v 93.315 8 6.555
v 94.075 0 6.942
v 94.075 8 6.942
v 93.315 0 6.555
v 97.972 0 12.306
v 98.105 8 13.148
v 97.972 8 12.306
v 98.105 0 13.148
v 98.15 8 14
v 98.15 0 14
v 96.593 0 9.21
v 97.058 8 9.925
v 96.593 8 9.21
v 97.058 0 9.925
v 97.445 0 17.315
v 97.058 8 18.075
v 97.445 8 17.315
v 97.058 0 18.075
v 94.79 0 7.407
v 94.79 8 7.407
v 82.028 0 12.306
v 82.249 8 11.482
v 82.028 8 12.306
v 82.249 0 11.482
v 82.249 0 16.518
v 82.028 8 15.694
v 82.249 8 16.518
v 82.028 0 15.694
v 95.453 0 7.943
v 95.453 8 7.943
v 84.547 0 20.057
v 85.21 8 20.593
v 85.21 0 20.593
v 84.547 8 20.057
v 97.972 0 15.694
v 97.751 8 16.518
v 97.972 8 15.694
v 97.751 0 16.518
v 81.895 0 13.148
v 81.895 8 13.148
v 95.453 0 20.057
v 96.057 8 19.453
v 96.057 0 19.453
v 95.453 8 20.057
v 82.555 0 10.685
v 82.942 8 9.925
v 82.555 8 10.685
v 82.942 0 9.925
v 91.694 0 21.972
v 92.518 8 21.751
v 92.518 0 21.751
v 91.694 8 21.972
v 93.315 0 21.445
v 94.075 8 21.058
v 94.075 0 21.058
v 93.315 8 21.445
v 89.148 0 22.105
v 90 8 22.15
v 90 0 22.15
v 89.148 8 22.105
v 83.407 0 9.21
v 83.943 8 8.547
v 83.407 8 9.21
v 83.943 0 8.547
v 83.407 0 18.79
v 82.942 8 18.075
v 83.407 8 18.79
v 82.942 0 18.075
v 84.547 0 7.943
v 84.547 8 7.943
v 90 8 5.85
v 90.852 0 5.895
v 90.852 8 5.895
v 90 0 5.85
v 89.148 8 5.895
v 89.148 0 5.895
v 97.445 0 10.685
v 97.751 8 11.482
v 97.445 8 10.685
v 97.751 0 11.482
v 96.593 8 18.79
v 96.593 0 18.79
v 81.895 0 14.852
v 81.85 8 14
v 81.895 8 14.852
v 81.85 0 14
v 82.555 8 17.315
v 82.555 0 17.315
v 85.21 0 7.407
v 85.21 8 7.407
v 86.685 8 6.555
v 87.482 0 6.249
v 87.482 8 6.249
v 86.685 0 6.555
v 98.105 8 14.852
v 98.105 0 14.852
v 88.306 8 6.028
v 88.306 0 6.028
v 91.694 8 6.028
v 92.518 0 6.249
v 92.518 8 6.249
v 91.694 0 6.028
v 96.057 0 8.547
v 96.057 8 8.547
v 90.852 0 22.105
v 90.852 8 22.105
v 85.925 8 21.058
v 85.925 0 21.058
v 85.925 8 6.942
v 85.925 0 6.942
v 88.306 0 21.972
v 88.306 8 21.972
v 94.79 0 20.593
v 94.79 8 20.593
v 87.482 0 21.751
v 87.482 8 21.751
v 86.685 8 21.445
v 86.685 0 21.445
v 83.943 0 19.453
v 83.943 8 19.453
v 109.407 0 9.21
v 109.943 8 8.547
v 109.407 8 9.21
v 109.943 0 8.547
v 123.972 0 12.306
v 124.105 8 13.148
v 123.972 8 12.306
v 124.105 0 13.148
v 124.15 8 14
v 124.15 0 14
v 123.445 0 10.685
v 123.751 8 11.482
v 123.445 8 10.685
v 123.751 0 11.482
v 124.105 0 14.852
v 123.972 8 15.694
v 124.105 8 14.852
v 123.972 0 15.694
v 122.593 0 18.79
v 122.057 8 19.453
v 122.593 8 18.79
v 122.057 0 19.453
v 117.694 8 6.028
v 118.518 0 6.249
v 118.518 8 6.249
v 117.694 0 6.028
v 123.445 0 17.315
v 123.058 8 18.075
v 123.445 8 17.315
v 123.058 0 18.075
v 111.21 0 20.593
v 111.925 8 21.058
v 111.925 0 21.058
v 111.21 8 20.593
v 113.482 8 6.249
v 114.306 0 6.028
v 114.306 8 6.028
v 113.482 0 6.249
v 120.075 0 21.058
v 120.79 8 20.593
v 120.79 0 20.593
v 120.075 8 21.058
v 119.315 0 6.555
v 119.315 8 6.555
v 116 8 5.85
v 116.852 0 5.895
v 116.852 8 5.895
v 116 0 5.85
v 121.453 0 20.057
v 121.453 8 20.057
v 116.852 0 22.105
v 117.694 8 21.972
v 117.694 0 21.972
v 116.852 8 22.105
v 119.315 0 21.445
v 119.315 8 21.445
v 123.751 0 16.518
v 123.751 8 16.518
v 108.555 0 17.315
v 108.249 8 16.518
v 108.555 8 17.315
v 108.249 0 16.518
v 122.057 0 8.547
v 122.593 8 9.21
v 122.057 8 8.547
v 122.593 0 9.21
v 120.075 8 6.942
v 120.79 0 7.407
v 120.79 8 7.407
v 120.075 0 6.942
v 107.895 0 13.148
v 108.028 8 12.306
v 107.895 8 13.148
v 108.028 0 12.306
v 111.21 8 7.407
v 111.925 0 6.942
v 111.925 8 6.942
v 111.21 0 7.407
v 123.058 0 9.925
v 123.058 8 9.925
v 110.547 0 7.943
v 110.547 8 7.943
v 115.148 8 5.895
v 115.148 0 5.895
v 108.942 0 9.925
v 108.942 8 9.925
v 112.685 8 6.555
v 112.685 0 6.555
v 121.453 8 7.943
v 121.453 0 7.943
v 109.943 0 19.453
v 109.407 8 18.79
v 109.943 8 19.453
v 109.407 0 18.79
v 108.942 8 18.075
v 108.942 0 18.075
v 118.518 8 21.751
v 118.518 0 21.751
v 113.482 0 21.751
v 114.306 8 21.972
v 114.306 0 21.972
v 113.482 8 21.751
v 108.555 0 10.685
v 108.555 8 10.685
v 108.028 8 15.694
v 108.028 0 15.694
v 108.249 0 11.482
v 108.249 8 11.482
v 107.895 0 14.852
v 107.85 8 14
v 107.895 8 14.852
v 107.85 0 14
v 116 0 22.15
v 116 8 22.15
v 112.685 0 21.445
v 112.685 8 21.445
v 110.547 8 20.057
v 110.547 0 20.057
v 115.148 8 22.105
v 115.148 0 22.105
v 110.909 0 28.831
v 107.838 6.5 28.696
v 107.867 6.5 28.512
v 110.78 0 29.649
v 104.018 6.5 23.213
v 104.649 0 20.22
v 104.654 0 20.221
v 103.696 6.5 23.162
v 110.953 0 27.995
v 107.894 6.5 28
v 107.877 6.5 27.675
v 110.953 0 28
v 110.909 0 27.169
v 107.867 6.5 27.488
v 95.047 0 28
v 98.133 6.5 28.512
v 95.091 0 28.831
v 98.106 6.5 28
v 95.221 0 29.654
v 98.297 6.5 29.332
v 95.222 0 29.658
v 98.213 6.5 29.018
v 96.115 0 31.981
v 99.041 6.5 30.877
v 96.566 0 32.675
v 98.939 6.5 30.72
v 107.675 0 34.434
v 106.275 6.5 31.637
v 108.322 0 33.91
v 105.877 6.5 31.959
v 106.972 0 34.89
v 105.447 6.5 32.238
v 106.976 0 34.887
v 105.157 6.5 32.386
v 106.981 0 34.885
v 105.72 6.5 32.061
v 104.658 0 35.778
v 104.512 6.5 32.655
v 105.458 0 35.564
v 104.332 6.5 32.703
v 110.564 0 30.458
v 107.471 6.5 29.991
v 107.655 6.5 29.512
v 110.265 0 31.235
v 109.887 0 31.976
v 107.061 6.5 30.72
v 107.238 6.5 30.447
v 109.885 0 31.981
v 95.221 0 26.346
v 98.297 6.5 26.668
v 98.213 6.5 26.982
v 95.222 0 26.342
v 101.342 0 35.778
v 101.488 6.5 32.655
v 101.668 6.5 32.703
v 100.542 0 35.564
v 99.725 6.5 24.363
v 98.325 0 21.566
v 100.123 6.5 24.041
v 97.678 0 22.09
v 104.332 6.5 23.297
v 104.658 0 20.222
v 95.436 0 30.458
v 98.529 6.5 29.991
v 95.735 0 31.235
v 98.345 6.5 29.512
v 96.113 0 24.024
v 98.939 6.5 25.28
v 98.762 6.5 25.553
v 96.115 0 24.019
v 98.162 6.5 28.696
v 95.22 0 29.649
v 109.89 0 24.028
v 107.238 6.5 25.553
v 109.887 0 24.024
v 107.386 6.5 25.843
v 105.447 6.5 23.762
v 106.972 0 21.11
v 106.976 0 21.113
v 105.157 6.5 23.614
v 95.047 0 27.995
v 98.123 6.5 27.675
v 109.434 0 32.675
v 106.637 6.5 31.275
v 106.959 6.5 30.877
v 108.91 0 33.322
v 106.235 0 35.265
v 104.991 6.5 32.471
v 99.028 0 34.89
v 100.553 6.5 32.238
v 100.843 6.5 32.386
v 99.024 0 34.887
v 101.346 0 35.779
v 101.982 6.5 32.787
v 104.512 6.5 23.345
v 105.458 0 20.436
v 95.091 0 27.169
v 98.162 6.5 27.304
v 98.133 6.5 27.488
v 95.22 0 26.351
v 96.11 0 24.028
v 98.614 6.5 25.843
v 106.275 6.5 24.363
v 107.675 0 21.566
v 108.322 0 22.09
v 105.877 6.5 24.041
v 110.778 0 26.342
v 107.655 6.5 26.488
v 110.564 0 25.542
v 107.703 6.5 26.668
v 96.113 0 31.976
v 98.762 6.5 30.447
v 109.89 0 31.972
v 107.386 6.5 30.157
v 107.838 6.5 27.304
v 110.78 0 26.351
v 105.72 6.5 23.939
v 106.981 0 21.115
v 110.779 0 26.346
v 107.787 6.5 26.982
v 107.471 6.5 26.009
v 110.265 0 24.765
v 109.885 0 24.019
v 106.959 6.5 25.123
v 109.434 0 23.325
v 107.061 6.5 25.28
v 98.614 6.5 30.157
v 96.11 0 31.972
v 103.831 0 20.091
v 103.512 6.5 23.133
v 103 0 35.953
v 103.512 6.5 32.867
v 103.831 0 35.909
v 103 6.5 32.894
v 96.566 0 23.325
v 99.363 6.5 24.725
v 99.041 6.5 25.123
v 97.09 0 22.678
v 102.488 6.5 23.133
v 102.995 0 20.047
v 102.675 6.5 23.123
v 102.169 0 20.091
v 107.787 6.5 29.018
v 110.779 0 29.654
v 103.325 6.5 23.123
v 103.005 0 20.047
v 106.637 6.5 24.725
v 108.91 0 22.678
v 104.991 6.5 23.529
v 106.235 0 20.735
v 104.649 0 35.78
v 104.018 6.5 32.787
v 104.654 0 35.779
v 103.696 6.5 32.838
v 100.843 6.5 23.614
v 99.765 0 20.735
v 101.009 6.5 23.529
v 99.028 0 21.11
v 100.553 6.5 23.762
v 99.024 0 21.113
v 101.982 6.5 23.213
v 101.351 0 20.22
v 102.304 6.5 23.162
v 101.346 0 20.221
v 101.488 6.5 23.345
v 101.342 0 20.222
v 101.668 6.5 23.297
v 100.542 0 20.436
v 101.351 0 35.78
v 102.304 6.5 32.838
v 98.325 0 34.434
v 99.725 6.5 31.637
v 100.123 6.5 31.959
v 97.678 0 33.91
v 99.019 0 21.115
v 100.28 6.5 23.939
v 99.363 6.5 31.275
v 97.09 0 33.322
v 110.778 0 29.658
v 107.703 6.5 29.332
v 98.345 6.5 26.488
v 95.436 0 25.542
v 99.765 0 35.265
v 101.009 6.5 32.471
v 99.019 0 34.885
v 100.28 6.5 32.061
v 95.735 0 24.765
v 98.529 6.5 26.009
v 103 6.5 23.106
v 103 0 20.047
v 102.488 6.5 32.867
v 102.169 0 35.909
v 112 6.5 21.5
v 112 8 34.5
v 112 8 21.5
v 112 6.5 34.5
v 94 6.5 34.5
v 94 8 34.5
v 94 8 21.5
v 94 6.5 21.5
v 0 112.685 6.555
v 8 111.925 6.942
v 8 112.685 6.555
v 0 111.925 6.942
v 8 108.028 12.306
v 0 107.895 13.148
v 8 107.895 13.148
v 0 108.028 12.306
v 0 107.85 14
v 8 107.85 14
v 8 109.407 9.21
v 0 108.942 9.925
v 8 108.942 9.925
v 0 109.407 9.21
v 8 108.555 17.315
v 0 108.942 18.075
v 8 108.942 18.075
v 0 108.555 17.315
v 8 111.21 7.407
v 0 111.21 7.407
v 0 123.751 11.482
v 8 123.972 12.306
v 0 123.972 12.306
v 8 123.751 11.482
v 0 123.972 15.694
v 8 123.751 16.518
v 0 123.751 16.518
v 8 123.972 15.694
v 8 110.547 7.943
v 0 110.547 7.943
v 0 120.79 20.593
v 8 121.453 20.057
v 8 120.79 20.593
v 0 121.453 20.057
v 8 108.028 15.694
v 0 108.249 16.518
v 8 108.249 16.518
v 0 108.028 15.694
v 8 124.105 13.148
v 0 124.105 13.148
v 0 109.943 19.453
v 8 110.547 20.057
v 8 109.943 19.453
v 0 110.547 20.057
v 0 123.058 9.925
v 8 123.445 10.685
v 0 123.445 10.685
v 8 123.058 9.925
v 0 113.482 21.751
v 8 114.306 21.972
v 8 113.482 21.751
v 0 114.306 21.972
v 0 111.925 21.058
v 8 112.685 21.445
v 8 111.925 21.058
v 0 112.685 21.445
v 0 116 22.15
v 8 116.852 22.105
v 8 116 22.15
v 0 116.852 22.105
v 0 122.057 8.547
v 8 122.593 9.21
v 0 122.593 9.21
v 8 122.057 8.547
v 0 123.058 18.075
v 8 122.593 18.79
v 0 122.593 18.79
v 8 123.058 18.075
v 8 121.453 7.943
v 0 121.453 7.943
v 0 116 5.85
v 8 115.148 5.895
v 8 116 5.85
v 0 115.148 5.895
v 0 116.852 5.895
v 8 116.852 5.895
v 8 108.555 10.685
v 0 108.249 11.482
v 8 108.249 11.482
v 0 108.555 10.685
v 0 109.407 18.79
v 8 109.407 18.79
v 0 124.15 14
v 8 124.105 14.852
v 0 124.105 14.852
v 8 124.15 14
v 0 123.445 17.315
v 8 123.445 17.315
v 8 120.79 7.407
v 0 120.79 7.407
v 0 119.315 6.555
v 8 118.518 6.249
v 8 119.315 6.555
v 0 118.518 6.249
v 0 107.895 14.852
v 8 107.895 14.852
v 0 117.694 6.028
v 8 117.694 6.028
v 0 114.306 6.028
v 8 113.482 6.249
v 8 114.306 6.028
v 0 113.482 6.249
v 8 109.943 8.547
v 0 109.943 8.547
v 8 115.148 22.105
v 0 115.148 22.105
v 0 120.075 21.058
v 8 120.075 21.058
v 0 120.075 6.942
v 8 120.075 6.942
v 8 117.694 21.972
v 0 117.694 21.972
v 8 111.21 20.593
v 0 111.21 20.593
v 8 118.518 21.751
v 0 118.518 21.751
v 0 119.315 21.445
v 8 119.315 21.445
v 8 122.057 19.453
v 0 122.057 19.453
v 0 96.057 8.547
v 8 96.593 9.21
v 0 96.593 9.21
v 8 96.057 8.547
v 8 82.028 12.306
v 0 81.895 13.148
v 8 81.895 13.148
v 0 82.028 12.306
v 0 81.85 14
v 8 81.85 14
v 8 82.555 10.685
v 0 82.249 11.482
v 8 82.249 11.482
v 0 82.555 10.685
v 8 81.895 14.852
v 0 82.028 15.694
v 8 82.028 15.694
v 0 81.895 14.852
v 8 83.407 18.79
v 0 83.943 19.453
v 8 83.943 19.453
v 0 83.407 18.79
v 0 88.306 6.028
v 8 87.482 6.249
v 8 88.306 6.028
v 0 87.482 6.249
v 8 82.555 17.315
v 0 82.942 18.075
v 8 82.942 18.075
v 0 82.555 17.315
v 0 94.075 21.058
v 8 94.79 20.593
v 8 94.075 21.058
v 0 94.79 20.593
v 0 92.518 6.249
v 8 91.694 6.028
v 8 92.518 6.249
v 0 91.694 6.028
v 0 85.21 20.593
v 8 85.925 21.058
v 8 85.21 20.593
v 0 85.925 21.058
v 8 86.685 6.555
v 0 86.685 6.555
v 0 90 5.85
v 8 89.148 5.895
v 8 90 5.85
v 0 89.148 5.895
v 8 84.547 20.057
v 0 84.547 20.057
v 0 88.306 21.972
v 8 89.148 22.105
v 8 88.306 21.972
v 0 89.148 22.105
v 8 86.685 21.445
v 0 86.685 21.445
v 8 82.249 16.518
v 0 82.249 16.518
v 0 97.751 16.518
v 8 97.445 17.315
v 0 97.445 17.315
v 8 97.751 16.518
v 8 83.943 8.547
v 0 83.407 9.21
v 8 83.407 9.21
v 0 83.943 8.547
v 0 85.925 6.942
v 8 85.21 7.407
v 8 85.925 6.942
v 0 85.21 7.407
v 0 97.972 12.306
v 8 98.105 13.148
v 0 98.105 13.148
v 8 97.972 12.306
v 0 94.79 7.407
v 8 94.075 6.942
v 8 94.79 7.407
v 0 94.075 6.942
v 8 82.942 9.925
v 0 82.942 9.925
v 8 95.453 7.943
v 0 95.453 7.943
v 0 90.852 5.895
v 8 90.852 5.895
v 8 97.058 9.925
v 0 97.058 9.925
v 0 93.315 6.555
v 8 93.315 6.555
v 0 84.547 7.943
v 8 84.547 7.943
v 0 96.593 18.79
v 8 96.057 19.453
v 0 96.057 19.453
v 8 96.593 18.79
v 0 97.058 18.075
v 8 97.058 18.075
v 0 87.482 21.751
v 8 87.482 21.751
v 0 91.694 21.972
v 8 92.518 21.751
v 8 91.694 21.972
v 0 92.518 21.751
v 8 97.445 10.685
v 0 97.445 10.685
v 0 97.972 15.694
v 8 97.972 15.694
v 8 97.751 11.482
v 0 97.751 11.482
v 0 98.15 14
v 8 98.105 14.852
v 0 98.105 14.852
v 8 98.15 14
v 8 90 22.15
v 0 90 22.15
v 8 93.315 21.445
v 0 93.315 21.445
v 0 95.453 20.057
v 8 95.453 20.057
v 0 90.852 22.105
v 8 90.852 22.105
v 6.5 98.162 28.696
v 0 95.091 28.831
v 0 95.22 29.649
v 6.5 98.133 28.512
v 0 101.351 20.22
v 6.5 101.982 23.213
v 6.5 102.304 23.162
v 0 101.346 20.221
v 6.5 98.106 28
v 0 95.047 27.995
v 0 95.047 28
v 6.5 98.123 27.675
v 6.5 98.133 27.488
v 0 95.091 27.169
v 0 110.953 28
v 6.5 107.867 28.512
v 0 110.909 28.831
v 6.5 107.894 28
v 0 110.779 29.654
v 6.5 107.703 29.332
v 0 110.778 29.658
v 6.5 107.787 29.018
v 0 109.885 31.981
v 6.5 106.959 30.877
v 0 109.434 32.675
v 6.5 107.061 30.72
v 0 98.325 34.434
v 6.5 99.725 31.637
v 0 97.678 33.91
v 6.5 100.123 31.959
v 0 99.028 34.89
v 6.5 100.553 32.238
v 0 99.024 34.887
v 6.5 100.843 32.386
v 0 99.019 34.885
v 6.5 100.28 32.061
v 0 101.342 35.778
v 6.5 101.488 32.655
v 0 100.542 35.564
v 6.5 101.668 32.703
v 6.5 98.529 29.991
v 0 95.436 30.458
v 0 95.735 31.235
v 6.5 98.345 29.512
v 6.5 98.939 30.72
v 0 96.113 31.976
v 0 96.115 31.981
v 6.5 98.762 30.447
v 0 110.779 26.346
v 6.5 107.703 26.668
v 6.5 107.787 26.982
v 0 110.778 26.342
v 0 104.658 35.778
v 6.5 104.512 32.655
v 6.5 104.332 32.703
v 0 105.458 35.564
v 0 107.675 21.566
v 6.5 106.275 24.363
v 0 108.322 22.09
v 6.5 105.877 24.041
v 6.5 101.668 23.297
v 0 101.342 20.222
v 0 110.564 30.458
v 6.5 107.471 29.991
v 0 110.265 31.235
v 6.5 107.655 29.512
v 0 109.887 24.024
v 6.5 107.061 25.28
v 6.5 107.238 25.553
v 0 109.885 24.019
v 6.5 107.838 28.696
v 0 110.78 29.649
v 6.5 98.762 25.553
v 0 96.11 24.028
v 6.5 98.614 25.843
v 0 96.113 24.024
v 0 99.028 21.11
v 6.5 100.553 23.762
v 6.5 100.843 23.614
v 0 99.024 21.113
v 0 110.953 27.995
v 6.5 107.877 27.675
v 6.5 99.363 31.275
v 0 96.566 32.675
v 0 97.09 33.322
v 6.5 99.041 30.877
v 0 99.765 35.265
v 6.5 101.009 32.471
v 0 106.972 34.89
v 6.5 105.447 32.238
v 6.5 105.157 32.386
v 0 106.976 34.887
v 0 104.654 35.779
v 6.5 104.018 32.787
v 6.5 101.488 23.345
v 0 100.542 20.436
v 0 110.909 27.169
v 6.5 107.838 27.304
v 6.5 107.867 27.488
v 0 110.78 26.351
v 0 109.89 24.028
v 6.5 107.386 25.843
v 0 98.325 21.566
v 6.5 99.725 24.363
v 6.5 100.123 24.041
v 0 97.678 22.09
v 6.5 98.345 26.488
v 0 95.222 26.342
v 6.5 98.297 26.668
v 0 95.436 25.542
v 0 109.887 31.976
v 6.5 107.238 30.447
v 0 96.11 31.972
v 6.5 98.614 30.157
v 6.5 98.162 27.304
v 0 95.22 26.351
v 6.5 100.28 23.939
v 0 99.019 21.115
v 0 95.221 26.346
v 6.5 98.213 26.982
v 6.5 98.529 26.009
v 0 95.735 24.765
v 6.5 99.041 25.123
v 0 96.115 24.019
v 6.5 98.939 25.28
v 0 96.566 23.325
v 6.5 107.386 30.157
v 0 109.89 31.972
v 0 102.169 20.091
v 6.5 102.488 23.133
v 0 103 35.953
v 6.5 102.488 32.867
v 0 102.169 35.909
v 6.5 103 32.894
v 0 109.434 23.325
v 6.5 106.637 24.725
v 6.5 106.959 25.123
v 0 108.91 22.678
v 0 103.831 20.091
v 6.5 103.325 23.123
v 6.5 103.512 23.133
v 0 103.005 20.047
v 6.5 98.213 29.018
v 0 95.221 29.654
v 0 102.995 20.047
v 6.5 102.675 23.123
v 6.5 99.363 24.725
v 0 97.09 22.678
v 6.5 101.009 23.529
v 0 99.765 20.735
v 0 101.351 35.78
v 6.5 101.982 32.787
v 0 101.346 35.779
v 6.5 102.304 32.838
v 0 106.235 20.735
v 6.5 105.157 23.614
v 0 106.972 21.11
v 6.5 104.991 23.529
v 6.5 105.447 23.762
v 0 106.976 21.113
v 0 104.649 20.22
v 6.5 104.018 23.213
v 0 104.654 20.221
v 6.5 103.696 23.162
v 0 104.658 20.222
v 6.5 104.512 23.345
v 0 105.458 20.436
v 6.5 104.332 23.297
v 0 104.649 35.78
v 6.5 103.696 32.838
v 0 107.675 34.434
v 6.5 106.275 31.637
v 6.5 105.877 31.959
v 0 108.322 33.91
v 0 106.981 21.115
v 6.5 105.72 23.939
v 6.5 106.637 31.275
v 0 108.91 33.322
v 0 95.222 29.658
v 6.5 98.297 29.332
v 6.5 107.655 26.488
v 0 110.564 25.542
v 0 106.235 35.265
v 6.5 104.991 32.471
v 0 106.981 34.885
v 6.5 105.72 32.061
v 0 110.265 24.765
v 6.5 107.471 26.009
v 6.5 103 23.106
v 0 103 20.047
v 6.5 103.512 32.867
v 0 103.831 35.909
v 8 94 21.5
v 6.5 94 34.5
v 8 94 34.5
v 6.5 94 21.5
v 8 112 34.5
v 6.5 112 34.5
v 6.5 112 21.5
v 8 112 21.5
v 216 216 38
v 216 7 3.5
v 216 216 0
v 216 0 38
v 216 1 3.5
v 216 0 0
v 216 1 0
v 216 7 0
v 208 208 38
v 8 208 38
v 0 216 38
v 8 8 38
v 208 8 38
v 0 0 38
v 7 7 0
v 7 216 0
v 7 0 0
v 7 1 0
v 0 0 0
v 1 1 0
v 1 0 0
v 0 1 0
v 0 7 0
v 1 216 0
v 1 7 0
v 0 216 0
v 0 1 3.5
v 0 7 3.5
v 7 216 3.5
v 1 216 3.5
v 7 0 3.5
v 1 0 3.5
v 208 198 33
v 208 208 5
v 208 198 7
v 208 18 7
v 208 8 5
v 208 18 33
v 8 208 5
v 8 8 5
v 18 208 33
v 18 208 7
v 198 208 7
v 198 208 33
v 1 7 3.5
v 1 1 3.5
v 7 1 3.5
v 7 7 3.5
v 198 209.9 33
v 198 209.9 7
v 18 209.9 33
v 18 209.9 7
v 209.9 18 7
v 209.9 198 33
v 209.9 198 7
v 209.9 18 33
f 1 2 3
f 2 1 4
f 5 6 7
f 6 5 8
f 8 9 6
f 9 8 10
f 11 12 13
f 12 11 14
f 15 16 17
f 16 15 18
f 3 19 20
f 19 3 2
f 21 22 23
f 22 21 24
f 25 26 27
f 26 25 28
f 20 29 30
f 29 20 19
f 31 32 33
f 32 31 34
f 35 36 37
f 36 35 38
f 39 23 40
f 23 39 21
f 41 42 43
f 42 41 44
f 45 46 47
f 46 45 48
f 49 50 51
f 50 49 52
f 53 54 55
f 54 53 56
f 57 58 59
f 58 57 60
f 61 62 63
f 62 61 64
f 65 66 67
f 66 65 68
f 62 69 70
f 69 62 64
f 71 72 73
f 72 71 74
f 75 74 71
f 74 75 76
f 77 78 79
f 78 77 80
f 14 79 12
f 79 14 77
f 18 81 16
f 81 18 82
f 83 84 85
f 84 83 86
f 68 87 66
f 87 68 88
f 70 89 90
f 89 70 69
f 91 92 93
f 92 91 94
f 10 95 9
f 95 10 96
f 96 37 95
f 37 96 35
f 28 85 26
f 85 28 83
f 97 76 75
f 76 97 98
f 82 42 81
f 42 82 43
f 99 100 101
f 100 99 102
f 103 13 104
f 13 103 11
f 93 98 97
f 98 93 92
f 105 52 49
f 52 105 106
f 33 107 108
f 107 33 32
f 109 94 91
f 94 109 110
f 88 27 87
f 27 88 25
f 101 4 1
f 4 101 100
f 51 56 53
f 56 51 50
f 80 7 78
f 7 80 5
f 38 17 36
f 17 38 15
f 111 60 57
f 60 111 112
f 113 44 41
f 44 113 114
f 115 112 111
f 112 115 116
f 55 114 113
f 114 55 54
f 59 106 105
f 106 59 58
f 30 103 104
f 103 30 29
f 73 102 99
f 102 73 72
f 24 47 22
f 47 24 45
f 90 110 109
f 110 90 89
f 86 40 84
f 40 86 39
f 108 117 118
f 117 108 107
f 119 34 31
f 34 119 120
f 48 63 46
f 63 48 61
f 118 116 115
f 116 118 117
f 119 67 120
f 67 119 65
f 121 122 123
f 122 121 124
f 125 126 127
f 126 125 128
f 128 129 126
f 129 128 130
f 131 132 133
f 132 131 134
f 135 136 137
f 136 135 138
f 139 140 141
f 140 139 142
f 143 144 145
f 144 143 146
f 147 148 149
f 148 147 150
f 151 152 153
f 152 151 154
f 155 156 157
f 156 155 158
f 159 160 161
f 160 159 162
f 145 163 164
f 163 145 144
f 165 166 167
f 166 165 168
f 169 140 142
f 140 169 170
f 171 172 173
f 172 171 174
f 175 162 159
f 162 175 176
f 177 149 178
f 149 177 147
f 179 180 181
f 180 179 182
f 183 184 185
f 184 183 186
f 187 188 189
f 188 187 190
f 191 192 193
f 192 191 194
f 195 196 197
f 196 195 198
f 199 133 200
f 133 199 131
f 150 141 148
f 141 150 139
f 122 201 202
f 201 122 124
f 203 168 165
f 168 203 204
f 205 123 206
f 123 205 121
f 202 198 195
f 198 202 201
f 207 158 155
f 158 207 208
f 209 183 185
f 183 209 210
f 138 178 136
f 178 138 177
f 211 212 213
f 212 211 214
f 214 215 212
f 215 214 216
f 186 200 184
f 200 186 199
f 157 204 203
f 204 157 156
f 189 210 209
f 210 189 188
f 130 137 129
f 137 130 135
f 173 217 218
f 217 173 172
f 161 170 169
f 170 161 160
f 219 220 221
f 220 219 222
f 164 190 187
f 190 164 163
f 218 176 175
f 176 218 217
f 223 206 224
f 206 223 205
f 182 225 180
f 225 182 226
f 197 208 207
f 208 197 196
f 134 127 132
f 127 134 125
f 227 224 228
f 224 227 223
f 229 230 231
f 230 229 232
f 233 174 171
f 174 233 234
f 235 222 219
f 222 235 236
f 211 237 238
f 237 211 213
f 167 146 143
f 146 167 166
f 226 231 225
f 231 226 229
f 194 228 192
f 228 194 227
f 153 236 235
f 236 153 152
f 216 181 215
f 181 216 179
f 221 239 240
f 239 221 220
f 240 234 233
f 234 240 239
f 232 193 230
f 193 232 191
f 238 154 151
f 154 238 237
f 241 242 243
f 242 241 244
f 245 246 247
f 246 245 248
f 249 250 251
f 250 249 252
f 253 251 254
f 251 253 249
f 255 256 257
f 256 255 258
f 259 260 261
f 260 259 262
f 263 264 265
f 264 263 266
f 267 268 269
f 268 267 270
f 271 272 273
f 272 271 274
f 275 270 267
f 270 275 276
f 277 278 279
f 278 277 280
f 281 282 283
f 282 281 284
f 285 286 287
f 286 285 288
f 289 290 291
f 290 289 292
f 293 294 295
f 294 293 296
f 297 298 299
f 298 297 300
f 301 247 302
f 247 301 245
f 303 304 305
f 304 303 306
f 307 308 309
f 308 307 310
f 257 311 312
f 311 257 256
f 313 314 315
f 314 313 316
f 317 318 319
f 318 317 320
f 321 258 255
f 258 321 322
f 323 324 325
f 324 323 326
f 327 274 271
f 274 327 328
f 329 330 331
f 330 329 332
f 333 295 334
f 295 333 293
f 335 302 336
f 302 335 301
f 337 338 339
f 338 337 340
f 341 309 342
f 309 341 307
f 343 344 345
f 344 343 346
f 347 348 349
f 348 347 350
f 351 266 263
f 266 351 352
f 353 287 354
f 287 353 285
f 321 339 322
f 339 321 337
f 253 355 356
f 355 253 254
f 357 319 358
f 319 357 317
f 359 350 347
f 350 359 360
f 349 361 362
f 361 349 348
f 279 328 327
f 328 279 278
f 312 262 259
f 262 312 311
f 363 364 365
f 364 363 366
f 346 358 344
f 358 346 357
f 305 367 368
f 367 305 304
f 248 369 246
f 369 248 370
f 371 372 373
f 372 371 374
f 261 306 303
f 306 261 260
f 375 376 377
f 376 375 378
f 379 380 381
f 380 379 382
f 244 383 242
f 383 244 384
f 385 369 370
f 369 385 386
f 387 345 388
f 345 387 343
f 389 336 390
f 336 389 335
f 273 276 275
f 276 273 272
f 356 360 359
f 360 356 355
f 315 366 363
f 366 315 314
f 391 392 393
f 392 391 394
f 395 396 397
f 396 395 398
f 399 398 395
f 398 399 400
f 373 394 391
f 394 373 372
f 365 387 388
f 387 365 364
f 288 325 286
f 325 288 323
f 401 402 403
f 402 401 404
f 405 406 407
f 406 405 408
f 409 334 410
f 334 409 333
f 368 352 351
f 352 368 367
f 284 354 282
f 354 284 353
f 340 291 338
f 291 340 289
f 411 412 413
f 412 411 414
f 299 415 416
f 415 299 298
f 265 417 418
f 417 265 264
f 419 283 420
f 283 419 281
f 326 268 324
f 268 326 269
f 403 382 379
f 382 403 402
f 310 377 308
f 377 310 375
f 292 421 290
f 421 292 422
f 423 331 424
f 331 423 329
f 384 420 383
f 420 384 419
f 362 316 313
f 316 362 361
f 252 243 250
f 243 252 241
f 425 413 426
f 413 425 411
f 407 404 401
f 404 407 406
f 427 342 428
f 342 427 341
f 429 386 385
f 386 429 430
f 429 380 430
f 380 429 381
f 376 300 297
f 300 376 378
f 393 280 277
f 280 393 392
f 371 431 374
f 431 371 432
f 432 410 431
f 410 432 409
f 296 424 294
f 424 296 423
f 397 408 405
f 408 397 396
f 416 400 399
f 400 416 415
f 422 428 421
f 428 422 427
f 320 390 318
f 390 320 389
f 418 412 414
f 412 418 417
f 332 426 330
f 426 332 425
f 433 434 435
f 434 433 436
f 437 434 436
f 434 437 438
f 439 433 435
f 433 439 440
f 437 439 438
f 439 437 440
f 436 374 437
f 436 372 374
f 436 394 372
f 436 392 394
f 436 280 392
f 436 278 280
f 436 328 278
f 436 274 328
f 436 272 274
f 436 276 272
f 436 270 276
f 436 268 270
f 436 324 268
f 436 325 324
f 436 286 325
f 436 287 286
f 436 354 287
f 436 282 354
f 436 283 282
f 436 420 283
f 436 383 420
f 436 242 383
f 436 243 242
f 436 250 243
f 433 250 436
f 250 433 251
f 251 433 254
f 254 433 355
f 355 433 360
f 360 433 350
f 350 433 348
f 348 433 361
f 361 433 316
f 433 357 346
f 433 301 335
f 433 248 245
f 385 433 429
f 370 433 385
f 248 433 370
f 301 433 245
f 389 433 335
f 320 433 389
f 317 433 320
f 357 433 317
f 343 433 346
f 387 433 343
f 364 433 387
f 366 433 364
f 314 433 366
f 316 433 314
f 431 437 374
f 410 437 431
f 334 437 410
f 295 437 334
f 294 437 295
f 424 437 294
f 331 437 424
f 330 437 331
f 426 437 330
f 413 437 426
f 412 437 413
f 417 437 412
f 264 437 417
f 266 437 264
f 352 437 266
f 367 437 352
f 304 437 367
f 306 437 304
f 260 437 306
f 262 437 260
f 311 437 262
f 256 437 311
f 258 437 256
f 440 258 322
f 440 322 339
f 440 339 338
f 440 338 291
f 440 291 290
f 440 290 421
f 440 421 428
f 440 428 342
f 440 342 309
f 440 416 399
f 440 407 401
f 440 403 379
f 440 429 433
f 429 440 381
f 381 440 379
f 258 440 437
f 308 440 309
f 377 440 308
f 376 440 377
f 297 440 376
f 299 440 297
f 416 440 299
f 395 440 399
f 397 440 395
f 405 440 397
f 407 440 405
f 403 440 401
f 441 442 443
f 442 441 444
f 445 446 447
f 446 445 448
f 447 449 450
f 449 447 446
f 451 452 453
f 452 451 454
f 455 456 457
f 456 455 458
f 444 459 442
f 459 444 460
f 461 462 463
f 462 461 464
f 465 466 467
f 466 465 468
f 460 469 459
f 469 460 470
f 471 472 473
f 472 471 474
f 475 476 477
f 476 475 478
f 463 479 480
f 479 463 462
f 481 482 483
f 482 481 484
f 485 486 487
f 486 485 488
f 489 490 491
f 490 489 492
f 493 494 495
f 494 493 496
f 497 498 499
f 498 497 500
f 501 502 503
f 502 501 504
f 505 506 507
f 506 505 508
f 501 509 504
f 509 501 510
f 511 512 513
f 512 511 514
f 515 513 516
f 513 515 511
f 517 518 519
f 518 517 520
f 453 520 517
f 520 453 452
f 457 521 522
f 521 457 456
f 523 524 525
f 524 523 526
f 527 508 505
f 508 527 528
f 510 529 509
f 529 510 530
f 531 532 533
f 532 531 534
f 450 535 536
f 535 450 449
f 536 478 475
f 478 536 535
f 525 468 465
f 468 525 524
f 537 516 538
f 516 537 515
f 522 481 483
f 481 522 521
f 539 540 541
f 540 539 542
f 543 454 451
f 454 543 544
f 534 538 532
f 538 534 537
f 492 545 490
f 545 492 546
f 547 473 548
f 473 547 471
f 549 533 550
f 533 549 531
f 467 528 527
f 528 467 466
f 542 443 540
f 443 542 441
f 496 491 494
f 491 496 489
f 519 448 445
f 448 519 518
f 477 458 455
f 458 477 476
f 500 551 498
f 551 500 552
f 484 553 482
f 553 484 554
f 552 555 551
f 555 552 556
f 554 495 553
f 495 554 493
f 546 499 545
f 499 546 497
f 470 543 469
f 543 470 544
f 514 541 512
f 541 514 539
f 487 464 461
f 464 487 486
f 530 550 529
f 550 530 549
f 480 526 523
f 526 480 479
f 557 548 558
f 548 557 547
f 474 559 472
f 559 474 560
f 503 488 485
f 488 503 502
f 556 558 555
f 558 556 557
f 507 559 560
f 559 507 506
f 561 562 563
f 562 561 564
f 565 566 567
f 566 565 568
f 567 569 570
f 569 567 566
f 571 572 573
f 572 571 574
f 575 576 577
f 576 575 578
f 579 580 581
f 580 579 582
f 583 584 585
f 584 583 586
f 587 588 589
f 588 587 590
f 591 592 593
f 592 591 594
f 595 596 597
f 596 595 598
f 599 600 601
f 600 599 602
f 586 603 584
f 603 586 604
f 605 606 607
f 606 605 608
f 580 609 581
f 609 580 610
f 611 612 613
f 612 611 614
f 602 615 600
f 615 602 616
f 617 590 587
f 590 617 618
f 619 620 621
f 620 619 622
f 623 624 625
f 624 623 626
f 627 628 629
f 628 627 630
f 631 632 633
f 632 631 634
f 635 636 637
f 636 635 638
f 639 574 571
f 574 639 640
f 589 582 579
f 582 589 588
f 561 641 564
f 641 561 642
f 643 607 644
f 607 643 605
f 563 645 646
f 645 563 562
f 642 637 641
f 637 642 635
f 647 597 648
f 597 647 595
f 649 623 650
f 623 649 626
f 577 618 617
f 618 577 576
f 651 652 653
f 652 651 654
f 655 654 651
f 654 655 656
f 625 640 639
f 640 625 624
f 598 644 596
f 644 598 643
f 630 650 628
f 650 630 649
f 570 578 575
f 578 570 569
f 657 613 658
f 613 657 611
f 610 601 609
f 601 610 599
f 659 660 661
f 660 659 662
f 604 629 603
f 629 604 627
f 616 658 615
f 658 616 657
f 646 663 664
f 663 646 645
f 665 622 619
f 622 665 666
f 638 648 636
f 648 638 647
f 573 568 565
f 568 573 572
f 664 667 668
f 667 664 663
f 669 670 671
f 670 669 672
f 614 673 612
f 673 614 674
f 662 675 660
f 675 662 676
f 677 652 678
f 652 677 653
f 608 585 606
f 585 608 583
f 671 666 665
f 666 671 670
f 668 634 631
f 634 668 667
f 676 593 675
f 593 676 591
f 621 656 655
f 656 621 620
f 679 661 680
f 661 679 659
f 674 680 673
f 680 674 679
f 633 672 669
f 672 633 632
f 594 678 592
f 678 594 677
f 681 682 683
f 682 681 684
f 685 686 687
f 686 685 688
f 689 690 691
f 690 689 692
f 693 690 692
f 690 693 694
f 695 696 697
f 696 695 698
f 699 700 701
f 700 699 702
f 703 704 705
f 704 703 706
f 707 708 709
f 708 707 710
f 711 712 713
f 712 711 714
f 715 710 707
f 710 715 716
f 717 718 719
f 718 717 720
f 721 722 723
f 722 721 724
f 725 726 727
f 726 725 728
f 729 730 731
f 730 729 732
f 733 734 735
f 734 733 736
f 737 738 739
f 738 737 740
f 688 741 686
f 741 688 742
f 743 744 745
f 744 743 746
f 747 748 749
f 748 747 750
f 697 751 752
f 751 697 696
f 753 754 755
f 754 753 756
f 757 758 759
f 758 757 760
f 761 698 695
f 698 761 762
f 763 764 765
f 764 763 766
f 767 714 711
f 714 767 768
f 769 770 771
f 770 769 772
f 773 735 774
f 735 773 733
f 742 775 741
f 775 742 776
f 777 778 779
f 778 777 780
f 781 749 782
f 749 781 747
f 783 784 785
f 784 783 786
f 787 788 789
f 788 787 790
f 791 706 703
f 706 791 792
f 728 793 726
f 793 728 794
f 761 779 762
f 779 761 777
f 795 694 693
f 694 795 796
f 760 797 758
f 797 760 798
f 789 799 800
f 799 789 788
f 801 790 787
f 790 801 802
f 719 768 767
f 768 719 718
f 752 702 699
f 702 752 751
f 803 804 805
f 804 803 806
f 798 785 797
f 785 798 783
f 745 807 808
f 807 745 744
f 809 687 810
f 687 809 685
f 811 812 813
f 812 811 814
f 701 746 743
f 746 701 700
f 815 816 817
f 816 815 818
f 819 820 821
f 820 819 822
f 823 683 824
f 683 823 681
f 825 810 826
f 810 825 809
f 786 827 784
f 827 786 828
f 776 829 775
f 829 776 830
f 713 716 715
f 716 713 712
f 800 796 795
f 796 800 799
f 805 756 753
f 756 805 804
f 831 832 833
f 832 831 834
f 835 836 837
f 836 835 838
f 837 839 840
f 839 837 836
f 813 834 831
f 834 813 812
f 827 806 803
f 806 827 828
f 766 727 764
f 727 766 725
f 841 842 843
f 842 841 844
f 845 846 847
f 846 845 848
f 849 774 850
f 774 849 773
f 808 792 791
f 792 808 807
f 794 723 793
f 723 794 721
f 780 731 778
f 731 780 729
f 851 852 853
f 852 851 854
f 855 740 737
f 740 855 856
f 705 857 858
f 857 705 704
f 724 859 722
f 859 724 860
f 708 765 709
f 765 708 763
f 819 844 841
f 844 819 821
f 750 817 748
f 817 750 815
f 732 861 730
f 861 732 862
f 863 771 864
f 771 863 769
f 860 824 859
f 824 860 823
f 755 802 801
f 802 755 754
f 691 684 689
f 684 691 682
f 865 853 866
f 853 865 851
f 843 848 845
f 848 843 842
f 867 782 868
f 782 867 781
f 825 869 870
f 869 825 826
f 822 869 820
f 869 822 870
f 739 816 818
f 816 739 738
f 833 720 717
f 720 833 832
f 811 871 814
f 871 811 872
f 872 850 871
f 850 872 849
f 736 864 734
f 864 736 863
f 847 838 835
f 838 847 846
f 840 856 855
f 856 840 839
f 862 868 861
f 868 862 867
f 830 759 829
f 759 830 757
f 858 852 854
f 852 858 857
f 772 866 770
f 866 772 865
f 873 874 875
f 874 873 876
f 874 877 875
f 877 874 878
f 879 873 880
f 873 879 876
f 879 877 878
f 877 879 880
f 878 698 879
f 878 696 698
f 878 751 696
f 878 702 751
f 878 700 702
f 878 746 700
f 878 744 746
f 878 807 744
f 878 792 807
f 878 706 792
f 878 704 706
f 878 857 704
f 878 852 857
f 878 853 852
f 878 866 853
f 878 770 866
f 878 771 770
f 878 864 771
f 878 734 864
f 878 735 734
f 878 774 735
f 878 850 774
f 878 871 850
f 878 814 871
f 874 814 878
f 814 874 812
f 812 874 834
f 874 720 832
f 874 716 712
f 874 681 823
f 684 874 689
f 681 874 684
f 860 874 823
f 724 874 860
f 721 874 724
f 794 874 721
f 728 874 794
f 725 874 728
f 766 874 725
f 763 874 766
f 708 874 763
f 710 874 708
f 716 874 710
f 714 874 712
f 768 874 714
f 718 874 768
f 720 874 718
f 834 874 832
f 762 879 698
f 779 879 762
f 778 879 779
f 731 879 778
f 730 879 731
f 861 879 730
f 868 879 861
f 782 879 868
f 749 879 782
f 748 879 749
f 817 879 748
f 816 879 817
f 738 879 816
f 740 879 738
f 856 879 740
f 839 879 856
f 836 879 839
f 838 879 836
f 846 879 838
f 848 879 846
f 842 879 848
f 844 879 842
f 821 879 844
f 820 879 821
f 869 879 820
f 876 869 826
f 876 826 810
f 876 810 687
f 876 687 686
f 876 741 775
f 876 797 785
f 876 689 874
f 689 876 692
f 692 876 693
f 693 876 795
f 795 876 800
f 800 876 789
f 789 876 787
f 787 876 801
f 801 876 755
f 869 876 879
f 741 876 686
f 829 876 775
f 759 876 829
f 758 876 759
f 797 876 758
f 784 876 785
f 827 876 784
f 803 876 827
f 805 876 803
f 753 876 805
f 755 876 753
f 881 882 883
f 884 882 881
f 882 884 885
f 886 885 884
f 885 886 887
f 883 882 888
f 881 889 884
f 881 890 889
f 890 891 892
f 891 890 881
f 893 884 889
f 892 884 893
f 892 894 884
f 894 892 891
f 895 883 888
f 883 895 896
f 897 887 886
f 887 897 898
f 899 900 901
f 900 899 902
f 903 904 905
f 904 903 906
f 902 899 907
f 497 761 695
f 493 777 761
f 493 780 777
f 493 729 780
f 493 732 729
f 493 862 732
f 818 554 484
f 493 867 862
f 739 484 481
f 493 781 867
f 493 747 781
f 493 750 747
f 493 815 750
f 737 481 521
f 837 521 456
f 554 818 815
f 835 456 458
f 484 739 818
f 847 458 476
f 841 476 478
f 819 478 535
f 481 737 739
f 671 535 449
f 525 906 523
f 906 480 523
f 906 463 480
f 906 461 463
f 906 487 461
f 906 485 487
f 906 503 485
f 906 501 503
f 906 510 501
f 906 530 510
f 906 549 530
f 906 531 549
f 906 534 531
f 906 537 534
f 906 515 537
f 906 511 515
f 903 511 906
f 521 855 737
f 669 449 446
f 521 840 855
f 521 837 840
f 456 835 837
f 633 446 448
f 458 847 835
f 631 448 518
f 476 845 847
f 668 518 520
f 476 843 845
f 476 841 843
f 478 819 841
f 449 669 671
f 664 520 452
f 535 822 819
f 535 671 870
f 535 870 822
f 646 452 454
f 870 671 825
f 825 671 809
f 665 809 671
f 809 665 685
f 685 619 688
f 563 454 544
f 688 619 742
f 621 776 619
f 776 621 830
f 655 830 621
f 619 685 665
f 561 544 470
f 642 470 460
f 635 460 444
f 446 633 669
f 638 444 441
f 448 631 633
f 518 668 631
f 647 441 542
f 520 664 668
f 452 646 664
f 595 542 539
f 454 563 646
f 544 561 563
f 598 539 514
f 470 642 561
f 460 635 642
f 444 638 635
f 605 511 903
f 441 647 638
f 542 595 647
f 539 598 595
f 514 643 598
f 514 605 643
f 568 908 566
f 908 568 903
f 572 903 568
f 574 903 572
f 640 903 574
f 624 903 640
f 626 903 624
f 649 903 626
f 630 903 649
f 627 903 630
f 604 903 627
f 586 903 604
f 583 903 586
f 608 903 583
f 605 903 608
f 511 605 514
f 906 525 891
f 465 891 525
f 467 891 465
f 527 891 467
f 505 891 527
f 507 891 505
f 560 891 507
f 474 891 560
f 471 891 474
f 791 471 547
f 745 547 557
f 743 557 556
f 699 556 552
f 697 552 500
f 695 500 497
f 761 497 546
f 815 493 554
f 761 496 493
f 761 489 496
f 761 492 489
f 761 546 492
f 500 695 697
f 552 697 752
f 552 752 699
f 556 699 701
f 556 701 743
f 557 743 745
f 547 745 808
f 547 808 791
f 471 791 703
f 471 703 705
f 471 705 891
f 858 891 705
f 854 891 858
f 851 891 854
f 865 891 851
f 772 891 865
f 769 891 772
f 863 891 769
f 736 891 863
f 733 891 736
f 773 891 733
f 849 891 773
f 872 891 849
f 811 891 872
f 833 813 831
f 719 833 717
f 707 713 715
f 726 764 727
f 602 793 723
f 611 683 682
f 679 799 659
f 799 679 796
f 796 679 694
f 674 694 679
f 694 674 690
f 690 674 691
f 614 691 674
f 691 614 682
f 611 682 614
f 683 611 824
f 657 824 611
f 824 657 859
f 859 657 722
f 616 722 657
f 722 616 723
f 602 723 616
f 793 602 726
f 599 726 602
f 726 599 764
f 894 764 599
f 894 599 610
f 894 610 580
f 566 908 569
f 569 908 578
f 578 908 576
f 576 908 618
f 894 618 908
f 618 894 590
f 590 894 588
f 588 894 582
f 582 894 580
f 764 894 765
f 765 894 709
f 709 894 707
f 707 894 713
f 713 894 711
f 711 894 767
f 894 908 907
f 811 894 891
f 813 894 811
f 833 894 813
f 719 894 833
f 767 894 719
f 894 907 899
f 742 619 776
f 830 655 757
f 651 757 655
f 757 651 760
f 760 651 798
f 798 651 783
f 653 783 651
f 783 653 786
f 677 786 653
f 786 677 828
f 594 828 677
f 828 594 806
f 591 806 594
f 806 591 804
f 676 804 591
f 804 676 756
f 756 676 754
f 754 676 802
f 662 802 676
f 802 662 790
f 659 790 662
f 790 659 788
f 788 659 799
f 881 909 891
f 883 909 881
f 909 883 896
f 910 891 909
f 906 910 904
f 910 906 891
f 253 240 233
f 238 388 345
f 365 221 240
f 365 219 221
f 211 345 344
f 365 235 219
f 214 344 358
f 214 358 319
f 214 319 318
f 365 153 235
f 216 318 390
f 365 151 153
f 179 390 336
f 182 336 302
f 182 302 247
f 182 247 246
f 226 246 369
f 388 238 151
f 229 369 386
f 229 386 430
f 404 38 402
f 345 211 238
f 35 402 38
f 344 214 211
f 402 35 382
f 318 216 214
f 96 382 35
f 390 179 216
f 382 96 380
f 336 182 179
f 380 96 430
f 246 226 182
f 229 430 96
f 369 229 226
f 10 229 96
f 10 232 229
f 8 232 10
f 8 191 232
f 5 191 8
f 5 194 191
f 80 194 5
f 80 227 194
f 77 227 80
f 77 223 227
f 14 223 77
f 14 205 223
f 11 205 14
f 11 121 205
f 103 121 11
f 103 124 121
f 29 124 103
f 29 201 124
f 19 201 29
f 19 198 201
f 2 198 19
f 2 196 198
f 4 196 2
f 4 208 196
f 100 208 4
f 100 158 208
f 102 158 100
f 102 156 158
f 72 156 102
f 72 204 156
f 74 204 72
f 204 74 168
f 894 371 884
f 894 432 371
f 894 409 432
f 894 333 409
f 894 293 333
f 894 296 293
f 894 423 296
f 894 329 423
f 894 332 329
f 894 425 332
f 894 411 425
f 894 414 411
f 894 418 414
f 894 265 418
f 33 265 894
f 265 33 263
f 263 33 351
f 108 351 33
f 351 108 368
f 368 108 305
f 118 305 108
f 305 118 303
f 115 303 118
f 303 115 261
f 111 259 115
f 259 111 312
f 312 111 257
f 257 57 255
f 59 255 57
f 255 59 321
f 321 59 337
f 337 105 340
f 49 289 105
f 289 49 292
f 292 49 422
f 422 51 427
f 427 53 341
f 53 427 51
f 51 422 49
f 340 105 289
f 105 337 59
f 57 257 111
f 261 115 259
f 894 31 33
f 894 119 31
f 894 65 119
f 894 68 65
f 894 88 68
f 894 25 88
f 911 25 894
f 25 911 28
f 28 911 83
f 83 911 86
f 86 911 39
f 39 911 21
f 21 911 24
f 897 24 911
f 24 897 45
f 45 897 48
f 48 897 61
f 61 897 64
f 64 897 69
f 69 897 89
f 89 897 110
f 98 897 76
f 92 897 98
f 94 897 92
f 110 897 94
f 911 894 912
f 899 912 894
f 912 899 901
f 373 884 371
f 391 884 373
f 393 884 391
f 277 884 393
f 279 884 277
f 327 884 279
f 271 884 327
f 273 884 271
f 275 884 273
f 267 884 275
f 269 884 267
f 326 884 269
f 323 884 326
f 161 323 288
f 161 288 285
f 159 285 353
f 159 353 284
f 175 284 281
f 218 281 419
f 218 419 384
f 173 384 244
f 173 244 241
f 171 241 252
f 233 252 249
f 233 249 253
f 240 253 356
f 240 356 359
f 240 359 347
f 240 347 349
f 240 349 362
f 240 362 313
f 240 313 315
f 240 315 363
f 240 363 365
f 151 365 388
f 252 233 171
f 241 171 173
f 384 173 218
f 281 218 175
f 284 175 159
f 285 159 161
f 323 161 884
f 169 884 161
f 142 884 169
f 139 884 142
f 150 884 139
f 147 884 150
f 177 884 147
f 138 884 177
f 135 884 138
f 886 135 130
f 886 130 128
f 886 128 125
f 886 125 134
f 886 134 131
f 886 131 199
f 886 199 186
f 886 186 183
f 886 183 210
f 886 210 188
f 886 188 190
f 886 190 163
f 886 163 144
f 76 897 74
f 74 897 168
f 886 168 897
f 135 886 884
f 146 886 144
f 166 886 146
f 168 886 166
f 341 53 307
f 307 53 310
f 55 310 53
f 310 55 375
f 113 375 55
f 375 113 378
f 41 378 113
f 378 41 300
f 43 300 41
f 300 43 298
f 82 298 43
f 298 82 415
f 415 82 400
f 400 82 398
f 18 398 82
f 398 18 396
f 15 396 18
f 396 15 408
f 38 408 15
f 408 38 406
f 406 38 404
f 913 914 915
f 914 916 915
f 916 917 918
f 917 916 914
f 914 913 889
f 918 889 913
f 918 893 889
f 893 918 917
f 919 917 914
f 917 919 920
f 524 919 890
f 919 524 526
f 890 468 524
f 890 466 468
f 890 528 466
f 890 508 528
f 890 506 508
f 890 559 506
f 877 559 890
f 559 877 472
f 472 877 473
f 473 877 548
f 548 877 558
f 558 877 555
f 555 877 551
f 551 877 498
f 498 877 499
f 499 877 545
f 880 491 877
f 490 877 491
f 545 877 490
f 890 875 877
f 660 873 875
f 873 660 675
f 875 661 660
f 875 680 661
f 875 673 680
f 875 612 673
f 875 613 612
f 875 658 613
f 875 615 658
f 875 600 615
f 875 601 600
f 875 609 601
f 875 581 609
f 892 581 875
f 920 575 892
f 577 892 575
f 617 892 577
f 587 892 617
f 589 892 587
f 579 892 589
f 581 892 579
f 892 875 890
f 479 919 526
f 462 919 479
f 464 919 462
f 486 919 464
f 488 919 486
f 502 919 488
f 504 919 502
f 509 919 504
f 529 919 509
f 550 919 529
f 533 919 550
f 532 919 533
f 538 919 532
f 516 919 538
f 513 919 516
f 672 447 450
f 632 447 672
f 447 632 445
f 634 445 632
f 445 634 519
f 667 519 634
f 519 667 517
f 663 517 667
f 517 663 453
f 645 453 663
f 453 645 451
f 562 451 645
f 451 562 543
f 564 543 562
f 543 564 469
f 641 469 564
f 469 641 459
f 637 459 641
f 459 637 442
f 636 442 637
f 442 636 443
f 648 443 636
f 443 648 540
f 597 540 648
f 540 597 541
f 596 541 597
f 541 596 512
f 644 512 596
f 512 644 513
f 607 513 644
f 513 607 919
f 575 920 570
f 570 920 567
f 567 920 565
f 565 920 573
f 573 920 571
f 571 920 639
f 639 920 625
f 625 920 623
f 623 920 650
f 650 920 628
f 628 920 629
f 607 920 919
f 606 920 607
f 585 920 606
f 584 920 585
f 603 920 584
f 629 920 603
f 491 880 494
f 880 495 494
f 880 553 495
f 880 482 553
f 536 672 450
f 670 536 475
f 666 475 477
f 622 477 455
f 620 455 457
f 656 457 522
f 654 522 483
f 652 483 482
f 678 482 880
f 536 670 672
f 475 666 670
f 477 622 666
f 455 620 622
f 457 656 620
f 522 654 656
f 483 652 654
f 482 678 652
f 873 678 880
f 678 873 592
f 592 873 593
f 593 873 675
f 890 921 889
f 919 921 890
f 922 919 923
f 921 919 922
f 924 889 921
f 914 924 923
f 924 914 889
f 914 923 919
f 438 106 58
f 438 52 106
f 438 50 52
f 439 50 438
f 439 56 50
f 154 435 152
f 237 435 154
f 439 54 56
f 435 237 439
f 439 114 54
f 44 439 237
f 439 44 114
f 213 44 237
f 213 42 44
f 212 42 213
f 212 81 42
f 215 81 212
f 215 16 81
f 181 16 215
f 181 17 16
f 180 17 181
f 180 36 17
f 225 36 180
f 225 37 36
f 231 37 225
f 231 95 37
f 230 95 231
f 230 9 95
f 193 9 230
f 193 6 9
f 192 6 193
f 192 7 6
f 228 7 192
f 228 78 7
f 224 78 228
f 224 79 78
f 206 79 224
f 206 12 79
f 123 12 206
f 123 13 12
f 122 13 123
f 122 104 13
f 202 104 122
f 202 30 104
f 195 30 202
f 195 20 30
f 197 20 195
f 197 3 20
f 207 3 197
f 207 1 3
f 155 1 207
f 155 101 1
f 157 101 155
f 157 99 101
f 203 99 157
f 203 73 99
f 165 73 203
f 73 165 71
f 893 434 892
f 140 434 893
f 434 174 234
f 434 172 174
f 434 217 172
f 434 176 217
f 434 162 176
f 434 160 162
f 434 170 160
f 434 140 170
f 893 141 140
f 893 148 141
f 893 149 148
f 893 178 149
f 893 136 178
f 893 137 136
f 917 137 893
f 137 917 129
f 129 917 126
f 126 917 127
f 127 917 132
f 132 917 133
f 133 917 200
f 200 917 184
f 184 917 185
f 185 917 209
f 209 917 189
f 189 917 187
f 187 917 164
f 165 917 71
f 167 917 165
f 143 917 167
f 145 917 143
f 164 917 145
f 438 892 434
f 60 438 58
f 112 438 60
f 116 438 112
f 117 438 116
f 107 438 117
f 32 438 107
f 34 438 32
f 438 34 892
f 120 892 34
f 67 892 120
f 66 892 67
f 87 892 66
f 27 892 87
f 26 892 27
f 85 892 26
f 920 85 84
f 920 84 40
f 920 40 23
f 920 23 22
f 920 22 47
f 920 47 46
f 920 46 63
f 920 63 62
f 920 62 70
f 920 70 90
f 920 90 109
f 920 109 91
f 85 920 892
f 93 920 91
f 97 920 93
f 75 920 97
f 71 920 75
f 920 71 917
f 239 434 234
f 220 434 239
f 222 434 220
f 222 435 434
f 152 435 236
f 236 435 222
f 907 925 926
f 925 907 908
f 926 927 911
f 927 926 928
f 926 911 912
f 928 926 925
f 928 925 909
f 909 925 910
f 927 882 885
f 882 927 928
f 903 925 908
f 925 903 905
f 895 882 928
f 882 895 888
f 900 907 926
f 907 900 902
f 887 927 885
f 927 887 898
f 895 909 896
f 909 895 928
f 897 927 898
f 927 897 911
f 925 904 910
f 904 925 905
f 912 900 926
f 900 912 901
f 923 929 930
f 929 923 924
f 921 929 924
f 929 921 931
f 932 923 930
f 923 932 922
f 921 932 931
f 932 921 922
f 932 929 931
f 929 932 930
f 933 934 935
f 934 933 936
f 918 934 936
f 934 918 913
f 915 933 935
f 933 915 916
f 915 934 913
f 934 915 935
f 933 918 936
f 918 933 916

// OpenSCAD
// cad/arena_base.scad — AEGIS-MECH v3.0 (Arena [120, 320] mm c/ VL53L1X subtraido + dutos)
$fn = 60;

arena_l     = 200.0;
arena_w     = 200.0;
piso_h      = 5.0;
par_t       = 8.0;
alt_borda   = 38.0;
us_r        = 8.15;
us_dist     = 26.0;
offset_cent = 95.0;

module janela_sensores_parede() {
    translate([-us_dist/2, 0, 14]) rotate([-90, 0, 0]) cylinder(r=us_r, h=par_t*3, center=true);
    translate([ us_dist/2, 0, 14]) rotate([-90, 0, 0]) cylinder(r=us_r, h=par_t*3, center=true);
    // Janela conica real do VL53L1X (corrige omission do v2.0 onde variaveis nunca eram subtraidas!)
    translate([0, -par_t/2 - 0.1, 28])
        rotate([-90, 0, 0])
            cylinder(r1 = 8.0, r2 = 4.0, h = par_t + 0.5);
    translate([-9.0, 2.5, 21.5]) cube([18.0, par_t, 13.0]);
}

module arena_base_v3() {
    ext_x = arena_l + 2*par_t;
    ext_y = arena_w + 2*par_t;
    difference() {
        cube([ext_x, ext_y, alt_borda]);
        translate([par_t, par_t, piso_h]) cube([arena_l, arena_w, alt_borda]);
        translate([par_t + offset_cent, par_t/2, 0]) janela_sensores_parede();
        translate([par_t/2, par_t + offset_cent, 0]) rotate([0, 0, -90]) janela_sensores_parede();

        // Dutos inferiores p/ passagem de chicote + recesso de espuma anti-multipath 5mm
        translate([-1, par_t/2 - 3, -0.5]) cube([ext_x + 2, 6.0, 4.0]);
        translate([par_t/2 - 3, -1, -0.5]) cube([6.0, ext_y + 2, 4.0]);
        translate([par_t + 10, ext_y - par_t - 0.1, piso_h + 2]) cube([arena_l - 20, 2.0, 26.0]);
        translate([ext_x - par_t - 0.1, par_t + 10, piso_h + 2]) cube([2.0, arena_w - 20, 26.0]);
    }
}

arena_base_v3();
